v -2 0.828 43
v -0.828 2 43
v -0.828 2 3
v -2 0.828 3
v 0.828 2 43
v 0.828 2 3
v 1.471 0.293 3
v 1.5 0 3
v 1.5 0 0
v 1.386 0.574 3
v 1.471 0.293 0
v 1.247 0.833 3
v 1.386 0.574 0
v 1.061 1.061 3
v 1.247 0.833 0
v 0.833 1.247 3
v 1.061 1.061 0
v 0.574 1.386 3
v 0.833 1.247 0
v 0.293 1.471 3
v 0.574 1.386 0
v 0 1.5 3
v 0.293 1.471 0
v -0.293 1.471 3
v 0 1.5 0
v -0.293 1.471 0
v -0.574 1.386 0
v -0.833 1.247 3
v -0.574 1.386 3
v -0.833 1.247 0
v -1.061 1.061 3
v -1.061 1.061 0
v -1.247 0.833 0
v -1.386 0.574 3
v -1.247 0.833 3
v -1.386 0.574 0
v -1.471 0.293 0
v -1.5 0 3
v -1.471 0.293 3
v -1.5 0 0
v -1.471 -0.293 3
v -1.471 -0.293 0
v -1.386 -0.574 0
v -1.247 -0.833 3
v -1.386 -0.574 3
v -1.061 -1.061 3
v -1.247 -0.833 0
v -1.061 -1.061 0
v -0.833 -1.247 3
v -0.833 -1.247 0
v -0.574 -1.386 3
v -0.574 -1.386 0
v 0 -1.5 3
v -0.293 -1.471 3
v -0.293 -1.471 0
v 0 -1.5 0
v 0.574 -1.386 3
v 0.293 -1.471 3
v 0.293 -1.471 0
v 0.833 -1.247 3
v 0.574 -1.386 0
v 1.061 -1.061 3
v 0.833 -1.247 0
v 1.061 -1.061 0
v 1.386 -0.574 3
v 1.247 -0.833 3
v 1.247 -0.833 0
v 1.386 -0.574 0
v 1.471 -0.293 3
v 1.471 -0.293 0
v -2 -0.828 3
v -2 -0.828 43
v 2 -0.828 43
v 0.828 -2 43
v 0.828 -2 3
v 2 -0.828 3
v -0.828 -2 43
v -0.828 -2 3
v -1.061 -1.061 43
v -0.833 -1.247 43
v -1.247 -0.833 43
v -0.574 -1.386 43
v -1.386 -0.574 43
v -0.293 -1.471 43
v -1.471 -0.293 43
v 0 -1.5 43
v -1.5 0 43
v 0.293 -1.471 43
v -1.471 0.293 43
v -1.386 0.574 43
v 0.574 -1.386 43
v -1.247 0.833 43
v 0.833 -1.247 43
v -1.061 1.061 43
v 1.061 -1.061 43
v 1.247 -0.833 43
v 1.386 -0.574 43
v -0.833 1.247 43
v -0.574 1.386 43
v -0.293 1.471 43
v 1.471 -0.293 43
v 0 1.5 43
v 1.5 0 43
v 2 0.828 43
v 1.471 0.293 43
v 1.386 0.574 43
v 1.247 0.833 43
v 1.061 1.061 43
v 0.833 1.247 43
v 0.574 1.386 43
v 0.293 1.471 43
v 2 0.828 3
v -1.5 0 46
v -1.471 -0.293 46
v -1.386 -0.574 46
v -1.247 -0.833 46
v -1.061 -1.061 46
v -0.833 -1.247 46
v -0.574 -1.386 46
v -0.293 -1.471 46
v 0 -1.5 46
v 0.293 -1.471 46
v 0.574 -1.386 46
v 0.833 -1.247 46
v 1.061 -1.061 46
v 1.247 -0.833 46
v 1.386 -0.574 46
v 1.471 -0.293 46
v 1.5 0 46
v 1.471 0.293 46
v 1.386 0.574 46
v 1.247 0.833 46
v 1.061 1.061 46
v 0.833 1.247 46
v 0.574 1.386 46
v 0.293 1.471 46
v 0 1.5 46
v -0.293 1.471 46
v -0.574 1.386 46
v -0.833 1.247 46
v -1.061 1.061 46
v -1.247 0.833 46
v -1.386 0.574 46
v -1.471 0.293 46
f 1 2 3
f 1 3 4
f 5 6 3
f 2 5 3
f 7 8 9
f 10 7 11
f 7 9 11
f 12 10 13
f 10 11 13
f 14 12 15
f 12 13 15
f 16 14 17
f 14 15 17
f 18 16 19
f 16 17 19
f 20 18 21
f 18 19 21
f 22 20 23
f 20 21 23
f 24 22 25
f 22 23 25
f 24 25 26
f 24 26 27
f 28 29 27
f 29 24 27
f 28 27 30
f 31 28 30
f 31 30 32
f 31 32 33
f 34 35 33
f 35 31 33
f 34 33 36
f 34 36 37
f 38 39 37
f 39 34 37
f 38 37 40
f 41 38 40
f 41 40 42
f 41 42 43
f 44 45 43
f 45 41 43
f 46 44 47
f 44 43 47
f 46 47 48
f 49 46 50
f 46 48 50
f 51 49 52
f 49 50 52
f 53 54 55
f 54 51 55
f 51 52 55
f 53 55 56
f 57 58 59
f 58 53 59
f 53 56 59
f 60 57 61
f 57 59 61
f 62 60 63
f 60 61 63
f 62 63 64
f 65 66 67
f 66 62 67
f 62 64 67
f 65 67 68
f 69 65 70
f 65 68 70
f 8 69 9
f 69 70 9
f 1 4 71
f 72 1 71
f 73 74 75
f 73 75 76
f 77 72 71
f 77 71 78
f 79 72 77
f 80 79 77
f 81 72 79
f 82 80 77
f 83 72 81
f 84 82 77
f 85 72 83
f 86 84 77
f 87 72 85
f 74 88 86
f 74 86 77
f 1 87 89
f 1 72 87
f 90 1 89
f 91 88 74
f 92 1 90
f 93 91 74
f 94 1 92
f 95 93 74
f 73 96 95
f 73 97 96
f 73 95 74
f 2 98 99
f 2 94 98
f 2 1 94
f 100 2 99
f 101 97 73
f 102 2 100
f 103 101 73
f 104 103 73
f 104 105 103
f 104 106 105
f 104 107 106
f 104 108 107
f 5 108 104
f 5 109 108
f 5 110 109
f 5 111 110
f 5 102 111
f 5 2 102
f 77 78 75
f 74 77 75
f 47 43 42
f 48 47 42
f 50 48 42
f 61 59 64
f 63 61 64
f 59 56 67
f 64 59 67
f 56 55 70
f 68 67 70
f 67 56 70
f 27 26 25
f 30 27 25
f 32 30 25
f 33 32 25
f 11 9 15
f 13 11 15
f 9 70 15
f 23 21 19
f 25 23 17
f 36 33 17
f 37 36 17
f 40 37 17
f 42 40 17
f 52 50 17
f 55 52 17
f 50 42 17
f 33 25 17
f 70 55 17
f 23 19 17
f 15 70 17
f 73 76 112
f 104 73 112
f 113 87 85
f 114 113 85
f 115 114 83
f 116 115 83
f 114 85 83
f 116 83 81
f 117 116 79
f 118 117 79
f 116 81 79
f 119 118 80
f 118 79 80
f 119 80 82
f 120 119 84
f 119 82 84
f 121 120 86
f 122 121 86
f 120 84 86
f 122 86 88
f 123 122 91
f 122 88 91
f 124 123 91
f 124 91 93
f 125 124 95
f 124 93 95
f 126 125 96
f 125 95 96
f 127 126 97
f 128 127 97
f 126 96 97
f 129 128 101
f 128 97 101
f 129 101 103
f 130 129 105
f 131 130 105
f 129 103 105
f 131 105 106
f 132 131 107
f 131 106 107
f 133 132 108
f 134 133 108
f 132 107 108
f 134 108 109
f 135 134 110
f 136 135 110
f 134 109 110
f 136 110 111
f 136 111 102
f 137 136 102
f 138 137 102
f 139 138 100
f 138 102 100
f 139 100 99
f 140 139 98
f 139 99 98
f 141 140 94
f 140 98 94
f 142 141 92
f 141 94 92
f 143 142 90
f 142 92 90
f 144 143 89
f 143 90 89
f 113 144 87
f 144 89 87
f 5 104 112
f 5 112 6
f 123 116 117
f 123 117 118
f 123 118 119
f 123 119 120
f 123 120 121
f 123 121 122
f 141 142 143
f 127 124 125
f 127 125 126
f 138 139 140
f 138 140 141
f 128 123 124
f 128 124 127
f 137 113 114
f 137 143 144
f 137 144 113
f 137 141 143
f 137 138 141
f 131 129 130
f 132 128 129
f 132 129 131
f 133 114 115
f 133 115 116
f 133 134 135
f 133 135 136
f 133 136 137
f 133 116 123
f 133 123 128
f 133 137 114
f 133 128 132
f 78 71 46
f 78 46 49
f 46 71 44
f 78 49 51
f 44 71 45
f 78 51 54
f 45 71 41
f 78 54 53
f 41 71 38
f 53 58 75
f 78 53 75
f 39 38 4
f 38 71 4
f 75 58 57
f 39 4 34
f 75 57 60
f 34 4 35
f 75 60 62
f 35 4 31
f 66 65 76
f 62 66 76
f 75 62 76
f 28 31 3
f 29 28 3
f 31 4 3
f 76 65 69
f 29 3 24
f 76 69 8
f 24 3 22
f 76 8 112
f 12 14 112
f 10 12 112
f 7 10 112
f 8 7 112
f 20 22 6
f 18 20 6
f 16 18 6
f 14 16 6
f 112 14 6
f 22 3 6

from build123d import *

# Parameters (mm, degrees)
CROQUIS1_R              = 1.5
SALIENTE_EXTRUIR1_DEPTH = 46
SALIENTE_EXTRUIR2_DEPTH = 43
CORTAR_EXTRUIR1_START   = -3
CROQUIS3_R              = 3.153795035
CROQUIS3_R_2            = 1.5
CORTAR_EXTRUIR1_DEPTH   = 3


with BuildPart() as part:
    # Croquis1 → Saliente-Extruir1 (new body)
    with BuildSketch(Plane.XY):
        Circle(CROQUIS1_R)
    extrude(amount=SALIENTE_EXTRUIR1_DEPTH)

    # Croquis2 → Saliente-Extruir2 (add)
    with BuildSketch(Plane.XY.offset(46)):
        Polygon((-0.828427125, -2), (0.828427125, -2), (2, -0.828427125), (2, 0.828427125), (0.828427125, 2), (-0.828427125, 2), (-2, 0.828427125), (-2, -0.828427125), align=None)
    extrude(amount=-SALIENTE_EXTRUIR2_DEPTH)

    # Croquis3 → Cortar-Extruir1 (cut)
    with BuildSketch(Plane.XY.offset(46).offset(CORTAR_EXTRUIR1_START)):
        Circle(CROQUIS3_R)
        with Locations(Location((0, 0, 0), (0, 0, 180))):
            Circle(CROQUIS3_R_2, mode=Mode.SUBTRACT)
    extrude(amount=CORTAR_EXTRUIR1_DEPTH, mode=Mode.SUBTRACT)


solid = part.part
